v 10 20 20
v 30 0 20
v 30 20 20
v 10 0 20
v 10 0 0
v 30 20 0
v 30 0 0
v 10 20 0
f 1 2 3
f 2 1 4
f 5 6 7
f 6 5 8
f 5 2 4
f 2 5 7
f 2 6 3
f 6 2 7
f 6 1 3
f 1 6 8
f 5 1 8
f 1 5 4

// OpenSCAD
// Sub-module B, solo export. Deliberately overlapping A: spans x 10..30, so
// x 10..20 is shared with A -- a 10x20x20 = 4000mm3 unintended overlap between
// two features that both live inside one part's union().

$fa = 2; $fs = 0.3;

// EXPECTED_BBOX: [20, 20, 20]
translate([10, 0, 0]) cube([20, 20, 20]);
